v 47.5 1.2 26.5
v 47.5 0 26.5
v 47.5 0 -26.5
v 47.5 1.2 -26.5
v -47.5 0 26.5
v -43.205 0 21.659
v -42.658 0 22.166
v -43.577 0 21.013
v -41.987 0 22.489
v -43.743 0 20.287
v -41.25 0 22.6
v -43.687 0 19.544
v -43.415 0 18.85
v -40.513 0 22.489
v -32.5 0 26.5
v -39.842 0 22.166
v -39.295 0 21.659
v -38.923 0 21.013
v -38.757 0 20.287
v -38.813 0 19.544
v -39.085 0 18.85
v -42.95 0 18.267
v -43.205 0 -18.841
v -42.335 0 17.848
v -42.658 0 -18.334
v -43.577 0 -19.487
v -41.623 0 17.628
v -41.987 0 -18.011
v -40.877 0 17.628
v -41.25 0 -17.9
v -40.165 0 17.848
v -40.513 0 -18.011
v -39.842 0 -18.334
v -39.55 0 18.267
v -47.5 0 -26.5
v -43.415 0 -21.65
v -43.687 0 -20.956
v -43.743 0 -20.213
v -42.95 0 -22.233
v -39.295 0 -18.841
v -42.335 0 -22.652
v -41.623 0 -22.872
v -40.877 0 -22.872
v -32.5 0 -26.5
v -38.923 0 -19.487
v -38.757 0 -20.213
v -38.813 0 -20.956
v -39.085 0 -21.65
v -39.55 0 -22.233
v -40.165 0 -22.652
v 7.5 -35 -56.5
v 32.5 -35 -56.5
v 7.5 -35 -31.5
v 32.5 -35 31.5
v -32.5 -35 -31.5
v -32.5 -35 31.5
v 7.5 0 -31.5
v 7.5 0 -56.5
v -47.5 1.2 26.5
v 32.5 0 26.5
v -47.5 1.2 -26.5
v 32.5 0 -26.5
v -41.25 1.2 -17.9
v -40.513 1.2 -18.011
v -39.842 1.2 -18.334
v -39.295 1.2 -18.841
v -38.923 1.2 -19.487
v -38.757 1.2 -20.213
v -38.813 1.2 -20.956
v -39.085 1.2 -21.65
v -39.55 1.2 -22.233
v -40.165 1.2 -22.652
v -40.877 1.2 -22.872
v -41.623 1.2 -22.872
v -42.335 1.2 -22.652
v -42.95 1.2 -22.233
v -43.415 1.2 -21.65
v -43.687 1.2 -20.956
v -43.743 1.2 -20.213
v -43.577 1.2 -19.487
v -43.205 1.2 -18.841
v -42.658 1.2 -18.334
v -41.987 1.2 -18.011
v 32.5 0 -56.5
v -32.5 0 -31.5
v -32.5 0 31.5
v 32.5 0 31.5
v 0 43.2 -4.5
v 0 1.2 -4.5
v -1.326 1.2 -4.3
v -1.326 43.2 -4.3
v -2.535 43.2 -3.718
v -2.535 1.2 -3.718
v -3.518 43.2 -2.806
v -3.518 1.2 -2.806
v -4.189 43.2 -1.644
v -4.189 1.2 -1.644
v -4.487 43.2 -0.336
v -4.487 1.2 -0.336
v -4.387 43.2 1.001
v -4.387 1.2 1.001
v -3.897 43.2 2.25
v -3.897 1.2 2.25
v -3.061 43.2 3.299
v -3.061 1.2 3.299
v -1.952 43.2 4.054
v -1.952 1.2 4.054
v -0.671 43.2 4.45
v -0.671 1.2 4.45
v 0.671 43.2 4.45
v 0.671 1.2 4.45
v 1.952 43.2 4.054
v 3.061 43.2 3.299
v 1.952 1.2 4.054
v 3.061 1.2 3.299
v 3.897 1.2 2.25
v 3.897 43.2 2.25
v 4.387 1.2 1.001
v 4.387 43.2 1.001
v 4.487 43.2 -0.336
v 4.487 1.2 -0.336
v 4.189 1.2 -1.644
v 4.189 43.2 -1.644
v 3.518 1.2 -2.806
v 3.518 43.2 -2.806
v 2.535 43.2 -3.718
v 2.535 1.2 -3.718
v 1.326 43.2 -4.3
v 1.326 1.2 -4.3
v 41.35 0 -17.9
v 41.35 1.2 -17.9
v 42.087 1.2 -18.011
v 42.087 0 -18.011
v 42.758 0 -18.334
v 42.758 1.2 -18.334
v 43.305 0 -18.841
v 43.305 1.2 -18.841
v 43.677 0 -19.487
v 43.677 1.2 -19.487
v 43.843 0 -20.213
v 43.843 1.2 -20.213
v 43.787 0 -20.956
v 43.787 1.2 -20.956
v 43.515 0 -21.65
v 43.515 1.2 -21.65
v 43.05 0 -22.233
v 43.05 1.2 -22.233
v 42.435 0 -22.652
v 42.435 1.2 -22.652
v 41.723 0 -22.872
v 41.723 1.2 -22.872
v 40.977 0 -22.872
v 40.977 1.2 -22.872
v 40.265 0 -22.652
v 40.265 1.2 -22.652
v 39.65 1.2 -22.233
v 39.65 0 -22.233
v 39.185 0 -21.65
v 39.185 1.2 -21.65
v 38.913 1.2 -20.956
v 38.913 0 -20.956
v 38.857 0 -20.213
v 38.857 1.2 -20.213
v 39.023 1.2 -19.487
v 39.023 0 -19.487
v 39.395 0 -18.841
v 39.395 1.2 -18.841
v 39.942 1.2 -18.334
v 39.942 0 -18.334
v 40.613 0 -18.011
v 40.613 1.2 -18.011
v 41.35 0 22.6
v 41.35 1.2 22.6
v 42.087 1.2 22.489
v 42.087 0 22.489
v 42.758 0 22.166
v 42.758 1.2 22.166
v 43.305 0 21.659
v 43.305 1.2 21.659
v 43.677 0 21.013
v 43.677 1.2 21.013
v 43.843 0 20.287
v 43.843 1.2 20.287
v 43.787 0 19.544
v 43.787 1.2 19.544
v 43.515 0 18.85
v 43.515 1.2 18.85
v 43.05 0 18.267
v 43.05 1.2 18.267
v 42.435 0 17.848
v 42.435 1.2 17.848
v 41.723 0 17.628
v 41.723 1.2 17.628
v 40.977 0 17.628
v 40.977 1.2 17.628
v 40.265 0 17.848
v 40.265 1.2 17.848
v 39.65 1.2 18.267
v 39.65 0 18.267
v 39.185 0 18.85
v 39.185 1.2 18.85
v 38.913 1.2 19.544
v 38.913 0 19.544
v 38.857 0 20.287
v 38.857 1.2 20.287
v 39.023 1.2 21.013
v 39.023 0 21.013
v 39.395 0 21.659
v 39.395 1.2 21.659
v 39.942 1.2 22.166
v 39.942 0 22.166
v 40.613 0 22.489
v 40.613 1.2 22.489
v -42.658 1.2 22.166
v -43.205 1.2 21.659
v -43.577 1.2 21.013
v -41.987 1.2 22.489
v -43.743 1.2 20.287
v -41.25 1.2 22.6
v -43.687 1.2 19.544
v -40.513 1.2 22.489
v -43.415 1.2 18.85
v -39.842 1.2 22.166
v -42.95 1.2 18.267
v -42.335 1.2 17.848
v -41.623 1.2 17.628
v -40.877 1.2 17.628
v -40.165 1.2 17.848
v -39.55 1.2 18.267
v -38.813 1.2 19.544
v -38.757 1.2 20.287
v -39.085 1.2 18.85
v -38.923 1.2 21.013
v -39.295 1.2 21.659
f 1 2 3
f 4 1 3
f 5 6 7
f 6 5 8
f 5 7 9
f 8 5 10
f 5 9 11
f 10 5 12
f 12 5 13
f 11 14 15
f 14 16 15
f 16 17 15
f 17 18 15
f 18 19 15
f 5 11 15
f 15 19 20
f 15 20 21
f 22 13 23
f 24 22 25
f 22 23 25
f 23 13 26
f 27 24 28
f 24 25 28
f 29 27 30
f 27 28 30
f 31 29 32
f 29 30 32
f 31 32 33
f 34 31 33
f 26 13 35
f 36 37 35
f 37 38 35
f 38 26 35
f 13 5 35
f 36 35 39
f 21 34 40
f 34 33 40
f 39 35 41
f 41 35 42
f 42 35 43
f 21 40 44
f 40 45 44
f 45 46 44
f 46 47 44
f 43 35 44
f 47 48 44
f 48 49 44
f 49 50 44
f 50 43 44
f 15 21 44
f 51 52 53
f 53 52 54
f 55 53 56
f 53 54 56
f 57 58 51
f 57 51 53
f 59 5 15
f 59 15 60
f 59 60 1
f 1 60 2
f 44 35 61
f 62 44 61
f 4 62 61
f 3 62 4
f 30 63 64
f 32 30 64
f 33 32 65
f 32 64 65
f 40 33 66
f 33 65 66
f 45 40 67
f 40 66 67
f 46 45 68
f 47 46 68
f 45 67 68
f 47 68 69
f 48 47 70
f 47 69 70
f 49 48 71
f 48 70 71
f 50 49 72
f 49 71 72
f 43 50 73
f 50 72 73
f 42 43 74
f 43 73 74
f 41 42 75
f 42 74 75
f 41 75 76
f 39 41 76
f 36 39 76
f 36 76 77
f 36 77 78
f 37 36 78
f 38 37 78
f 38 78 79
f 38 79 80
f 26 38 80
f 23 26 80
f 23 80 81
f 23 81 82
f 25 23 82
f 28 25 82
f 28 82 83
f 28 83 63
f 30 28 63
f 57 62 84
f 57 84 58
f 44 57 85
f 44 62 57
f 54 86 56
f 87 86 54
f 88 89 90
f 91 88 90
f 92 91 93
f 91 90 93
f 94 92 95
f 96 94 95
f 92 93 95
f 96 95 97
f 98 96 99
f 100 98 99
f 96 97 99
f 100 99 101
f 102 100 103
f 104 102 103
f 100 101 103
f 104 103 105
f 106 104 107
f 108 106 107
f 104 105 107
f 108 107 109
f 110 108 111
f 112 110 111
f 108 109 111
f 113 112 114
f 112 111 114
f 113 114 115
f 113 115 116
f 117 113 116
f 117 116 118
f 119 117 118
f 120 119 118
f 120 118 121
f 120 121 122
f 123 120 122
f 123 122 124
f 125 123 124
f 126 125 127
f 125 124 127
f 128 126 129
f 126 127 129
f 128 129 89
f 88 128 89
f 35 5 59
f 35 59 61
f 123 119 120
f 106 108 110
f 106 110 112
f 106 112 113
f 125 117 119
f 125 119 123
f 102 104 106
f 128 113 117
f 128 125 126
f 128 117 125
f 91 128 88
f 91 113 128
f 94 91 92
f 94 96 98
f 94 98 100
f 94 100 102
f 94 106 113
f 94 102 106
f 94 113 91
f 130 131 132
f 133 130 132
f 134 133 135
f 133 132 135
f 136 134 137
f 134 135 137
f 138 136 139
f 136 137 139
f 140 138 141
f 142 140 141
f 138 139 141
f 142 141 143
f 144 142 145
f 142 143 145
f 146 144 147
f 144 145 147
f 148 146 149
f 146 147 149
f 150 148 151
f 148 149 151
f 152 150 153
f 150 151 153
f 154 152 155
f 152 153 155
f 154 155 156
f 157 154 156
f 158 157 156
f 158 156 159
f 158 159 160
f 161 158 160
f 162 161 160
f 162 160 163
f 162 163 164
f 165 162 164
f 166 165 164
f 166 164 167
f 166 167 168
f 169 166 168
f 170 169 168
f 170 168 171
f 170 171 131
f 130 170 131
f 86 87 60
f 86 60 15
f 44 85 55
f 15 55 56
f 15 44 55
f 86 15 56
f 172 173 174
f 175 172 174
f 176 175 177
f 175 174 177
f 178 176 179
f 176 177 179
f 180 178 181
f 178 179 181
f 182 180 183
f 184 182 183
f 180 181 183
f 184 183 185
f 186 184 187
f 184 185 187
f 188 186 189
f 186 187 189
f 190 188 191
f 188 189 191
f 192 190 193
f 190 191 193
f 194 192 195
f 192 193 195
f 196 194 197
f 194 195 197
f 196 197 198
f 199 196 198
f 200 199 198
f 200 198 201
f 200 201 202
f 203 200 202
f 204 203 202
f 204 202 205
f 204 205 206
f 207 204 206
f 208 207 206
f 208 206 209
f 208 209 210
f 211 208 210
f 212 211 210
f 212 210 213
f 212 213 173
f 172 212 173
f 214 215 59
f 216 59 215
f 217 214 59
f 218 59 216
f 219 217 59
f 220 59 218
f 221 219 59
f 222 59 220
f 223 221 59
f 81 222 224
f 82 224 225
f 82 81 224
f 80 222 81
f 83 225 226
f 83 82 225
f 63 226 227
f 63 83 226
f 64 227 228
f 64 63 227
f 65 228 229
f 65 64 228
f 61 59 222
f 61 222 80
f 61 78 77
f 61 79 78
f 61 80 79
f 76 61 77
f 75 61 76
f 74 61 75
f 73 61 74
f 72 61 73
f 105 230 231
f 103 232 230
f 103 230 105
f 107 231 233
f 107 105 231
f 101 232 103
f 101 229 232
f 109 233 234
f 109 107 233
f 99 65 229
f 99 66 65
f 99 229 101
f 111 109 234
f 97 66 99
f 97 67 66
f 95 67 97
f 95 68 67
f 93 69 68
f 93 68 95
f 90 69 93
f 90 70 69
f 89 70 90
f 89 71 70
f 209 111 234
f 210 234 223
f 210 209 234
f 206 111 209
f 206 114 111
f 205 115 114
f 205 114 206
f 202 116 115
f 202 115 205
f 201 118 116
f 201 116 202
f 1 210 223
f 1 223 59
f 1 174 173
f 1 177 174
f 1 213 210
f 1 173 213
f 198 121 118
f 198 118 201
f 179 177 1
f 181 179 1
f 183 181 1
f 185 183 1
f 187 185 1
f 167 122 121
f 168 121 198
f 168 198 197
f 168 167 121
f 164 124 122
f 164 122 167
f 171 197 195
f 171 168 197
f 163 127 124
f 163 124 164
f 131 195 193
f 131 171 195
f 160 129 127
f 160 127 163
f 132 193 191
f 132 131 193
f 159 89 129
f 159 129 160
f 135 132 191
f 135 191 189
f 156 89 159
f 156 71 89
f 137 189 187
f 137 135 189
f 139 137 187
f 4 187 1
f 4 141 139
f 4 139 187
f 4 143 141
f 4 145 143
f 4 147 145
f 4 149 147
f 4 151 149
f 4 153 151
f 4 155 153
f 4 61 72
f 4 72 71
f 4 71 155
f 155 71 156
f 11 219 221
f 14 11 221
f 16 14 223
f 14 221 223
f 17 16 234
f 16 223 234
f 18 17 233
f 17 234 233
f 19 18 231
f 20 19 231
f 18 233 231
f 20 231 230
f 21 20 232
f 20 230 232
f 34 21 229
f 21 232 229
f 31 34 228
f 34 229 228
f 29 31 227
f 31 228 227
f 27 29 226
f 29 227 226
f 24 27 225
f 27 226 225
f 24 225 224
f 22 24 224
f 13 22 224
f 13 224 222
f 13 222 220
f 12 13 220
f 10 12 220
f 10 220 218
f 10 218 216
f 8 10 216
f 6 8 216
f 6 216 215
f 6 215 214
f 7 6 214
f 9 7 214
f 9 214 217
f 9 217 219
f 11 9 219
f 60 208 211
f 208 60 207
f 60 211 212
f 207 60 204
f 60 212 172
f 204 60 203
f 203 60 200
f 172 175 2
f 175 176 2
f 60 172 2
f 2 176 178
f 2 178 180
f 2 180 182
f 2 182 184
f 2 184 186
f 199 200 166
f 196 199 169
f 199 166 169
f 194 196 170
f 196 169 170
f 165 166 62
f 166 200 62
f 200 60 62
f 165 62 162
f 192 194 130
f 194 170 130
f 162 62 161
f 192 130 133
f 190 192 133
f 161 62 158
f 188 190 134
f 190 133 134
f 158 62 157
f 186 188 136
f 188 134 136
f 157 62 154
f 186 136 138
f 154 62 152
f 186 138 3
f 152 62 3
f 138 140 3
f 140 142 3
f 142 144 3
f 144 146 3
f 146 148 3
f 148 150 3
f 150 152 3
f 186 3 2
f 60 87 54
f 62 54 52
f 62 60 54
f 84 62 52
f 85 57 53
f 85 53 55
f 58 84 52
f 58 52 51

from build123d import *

# Parameters (mm, degrees)
SKETCH_1_W            = 95
SKETCH_1_H            = 53
EXTRUDE_244_DEPTH     = 1.2
CUT_EXTRUDE_624_REACH = 56.405
SKETCH_5_R            = 2.5
EXTRUDE_1004_DEPTH    = 35
SKETCH_7_R            = 4.5
EXTRUDE_1173_DEPTH    = 42


with BuildPart() as part:
    # 草图1 → Extrude 244 (new body)
    with BuildSketch(Plane(origin=(0, 0, 0), x_dir=(1, 0, 0), z_dir=(0, 1, 0))):
        Rectangle(SKETCH_1_W, SKETCH_1_H)
    extrude(amount=EXTRUDE_244_DEPTH)

    # 草图5 → Cut-Extrude 624 (cut, up to next)
    with BuildSketch(Plane(origin=(0, 1.2, 0), x_dir=(1, 0, 0), z_dir=(0, 1, 0)), mode=Mode.PRIVATE) as cut_extrude_624_sk1:
        with Locations(Location((-41.25, 20.4, 0), (0, 0, 270))):
            Circle(SKETCH_5_R)
    cut_extrude_624_tool1 = extrude(cut_extrude_624_sk1.sketch, amount=-CUT_EXTRUDE_624_REACH, mode=Mode.PRIVATE) & part.part
    # 草图5 → Cut-Extrude 624 (cut, up to next)
    with BuildSketch(Plane(origin=(0, 1.2, 0), x_dir=(1, 0, 0), z_dir=(0, 1, 0)), mode=Mode.PRIVATE) as cut_extrude_624_sk2:
        with Locations(Location((41.35, 20.4, 0), (0, 0, 270))):
            Circle(SKETCH_5_R)
    cut_extrude_624_tool2 = extrude(cut_extrude_624_sk2.sketch, amount=-CUT_EXTRUDE_624_REACH, mode=Mode.PRIVATE) & part.part
    # 草图5 → Cut-Extrude 624 (cut, up to next)
    with BuildSketch(Plane(origin=(0, 1.2, 0), x_dir=(1, 0, 0), z_dir=(0, 1, 0)), mode=Mode.PRIVATE) as cut_extrude_624_sk3:
        with Locations(Location((-41.25, -20.1, 0), (0, 0, 270))):
            Circle(SKETCH_5_R)
    cut_extrude_624_tool3 = extrude(cut_extrude_624_sk3.sketch, amount=-CUT_EXTRUDE_624_REACH, mode=Mode.PRIVATE) & part.part
    # 草图5 → Cut-Extrude 624 (cut, up to next)
    with BuildSketch(Plane(origin=(0, 1.2, 0), x_dir=(1, 0, 0), z_dir=(0, 1, 0)), mode=Mode.PRIVATE) as cut_extrude_624_sk4:
        with Locations(Location((41.35, -20.1, 0), (0, 0, 270))):
            Circle(SKETCH_5_R)
    cut_extrude_624_tool4 = extrude(cut_extrude_624_sk4.sketch, amount=-CUT_EXTRUDE_624_REACH, mode=Mode.PRIVATE) & part.part
    add(cut_extrude_624_tool1.solids().sort_by_distance((-41.25, 1.2, -20.4))[0], mode=Mode.SUBTRACT)
    add(cut_extrude_624_tool2.solids().sort_by_distance((41.35, 1.2, -20.4))[0], mode=Mode.SUBTRACT)
    add(cut_extrude_624_tool3.solids().sort_by_distance((-41.25, 1.2, 20.1))[0], mode=Mode.SUBTRACT)
    add(cut_extrude_624_tool4.solids().sort_by_distance((41.35, 1.2, 20.1))[0], mode=Mode.SUBTRACT)

    # 草图6 → Extrude 1004 (add)
    with BuildSketch(Plane.XZ):
        Polygon((32.5, -56.5), (7.5, -56.5), (7.5, -31.5), (-32.5, -31.5), (-32.5, 31.5), (32.5, 31.5), align=None)
    extrude(amount=EXTRUDE_1004_DEPTH)

    # 草图7 → Extrude 1173 (add)
    with BuildSketch(Plane(origin=(0, 1.2, 0), x_dir=(1, 0, 0), z_dir=(0, 1, 0))):
        with Locations(Location((0, 0, 0), (0, 0, 90))):
            Circle(SKETCH_7_R)
    extrude(amount=EXTRUDE_1173_DEPTH)


solid = part.part
